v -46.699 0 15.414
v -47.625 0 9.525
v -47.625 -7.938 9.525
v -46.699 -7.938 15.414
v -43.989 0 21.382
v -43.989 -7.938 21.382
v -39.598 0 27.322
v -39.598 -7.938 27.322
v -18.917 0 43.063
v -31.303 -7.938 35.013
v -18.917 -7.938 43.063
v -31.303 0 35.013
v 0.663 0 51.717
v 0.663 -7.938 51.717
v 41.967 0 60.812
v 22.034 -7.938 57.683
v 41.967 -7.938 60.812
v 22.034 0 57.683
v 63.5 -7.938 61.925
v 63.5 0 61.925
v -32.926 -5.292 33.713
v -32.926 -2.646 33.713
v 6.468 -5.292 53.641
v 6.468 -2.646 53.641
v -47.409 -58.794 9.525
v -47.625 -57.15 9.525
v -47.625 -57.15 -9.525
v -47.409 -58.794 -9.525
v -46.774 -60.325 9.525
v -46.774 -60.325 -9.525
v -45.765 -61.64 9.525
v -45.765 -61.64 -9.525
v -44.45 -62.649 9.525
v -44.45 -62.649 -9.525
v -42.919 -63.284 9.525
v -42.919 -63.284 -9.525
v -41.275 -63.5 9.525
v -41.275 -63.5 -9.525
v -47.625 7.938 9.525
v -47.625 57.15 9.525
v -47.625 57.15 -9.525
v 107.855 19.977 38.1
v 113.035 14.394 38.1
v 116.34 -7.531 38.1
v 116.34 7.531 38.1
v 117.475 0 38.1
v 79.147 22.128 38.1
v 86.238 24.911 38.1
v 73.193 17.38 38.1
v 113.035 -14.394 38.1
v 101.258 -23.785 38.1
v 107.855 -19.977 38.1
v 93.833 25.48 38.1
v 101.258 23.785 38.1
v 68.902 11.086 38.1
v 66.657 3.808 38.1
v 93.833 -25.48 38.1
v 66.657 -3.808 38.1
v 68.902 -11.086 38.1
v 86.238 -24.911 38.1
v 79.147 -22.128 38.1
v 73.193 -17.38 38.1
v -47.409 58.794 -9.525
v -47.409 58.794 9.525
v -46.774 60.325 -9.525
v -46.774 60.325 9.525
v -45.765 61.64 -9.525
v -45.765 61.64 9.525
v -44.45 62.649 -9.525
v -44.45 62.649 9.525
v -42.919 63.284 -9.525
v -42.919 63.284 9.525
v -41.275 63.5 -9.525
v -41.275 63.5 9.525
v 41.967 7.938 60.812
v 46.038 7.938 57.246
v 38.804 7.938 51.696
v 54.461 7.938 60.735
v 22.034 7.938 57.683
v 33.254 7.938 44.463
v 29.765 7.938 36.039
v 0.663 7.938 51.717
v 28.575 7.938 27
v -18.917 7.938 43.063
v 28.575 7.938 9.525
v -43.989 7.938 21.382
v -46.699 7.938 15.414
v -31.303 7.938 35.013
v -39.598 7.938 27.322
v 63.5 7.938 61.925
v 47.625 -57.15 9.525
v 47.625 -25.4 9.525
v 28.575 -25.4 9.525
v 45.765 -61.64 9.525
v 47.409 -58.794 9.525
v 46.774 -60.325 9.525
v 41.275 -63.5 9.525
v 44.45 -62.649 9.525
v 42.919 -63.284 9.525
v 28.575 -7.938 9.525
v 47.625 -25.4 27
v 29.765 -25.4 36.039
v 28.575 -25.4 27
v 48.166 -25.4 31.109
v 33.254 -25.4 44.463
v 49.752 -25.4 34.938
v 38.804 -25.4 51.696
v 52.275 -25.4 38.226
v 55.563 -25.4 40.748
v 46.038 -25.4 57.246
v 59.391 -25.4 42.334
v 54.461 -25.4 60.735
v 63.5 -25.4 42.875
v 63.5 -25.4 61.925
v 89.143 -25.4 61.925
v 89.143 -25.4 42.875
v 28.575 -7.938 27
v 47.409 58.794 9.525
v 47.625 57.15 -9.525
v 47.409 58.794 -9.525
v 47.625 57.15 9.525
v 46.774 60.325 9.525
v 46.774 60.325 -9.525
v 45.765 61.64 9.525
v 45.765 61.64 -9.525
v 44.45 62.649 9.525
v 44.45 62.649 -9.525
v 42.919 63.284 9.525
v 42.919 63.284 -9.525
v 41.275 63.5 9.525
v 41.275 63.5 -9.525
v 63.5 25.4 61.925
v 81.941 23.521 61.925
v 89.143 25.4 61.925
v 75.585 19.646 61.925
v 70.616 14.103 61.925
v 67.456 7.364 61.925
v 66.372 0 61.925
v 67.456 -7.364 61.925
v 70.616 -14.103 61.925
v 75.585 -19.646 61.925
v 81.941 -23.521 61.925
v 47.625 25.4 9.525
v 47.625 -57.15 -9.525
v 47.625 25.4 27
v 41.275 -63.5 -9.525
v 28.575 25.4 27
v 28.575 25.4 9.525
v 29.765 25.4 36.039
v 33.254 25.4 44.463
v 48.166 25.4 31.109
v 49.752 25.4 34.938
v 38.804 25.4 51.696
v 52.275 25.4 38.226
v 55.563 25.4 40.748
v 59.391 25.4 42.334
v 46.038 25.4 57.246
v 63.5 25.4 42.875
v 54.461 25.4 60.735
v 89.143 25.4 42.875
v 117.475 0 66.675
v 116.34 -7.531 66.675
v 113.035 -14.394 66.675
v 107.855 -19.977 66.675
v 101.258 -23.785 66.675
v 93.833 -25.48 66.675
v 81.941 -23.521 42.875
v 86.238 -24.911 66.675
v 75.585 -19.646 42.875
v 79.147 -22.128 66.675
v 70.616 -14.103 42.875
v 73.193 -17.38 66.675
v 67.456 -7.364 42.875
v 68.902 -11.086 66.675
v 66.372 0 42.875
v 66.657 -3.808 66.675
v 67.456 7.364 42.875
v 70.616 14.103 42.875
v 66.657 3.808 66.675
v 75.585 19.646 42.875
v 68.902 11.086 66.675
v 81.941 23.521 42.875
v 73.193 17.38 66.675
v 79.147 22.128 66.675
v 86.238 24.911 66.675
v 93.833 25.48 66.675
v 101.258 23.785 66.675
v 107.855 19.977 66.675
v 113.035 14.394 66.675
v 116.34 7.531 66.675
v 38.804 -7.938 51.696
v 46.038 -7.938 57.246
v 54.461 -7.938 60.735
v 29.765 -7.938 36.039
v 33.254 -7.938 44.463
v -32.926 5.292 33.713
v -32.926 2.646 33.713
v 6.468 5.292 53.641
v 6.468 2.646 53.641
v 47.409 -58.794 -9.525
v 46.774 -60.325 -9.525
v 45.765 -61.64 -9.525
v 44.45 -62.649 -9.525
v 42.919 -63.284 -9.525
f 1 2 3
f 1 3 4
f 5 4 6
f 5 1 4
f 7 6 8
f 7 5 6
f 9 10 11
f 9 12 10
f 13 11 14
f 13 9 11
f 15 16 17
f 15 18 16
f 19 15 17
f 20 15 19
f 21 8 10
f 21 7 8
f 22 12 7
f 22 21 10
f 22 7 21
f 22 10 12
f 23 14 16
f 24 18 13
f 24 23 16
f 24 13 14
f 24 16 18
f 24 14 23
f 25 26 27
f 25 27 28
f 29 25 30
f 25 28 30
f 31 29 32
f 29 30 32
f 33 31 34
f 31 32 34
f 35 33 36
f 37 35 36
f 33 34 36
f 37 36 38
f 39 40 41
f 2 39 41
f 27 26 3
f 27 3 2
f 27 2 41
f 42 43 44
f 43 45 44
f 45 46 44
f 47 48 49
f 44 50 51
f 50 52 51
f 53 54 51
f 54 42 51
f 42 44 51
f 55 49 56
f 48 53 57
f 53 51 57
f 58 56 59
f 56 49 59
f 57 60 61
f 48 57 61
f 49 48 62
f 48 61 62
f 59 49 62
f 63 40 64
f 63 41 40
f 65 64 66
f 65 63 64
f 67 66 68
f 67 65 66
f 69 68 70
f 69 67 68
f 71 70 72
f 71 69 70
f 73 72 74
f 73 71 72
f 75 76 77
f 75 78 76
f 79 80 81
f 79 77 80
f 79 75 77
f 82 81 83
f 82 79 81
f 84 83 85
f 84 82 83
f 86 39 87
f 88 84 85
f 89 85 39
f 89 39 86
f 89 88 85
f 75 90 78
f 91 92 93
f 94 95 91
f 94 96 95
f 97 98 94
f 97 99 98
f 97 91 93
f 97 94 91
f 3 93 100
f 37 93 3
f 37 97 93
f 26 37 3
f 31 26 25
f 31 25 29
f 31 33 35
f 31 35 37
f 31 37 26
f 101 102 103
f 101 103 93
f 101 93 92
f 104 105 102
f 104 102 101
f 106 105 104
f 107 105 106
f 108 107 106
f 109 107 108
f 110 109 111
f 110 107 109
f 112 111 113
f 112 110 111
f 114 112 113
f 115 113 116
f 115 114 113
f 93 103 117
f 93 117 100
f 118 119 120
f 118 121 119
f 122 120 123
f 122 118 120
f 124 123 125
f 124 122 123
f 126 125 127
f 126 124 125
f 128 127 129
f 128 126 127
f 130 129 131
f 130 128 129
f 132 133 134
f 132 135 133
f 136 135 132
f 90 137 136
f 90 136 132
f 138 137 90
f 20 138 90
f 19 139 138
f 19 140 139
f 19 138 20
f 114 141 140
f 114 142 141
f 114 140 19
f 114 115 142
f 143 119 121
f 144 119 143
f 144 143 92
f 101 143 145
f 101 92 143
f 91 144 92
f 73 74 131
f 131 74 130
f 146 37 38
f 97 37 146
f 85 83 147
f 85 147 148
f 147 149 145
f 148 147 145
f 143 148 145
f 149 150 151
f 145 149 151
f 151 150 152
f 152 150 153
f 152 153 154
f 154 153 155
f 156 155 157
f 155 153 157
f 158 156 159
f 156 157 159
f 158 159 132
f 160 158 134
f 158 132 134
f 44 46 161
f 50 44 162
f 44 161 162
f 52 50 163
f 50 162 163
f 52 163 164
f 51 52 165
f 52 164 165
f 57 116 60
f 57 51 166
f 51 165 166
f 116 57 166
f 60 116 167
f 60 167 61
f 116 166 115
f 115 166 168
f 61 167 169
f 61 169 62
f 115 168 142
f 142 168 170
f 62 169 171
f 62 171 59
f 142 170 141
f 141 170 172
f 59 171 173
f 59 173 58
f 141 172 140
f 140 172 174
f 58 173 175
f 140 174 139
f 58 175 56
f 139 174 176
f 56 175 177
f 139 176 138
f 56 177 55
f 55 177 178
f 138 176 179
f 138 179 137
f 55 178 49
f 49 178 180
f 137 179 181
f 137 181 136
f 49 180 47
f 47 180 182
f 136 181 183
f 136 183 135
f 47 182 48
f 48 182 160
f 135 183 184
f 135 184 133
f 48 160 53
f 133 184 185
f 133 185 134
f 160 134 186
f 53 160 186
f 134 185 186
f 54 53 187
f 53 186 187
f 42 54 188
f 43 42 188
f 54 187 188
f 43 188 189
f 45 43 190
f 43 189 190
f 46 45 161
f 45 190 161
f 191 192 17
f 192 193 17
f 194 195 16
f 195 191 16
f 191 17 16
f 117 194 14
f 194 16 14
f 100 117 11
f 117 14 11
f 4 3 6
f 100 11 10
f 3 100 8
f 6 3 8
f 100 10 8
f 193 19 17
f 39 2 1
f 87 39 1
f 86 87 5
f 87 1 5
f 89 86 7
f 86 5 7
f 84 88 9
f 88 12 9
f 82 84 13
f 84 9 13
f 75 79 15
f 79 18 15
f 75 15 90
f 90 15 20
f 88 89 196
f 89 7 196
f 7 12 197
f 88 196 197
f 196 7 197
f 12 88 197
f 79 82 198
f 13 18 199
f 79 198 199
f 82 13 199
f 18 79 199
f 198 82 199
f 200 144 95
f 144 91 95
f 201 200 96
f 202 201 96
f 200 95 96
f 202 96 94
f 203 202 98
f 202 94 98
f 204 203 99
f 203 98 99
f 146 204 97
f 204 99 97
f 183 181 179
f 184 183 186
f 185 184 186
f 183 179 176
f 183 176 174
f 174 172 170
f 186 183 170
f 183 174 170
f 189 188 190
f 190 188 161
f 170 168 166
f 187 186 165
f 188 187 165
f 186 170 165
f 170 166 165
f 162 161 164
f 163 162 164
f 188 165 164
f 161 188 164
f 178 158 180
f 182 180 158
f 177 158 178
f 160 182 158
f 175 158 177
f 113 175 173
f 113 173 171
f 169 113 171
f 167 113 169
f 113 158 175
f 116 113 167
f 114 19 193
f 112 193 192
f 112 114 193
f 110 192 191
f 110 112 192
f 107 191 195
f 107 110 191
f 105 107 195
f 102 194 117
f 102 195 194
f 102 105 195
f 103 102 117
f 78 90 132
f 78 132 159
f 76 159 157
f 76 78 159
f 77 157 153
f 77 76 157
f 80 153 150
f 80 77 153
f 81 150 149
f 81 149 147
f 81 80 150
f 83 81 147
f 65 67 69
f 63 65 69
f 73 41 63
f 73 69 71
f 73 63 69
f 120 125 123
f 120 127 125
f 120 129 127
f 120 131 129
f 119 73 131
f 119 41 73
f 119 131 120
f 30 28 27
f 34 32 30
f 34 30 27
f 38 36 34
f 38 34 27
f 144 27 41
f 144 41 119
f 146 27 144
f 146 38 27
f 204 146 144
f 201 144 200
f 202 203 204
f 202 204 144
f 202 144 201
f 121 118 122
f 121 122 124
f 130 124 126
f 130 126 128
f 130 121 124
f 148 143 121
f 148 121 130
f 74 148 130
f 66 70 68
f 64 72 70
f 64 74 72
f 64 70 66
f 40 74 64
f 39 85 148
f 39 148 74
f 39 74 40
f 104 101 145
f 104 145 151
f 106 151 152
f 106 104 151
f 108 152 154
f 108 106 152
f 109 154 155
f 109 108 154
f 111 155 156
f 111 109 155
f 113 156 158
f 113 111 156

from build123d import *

# Parameters (mm, degrees)
F1_DEPTH = 63.5
F2_DEPTH = 7.9375
F0_W     = 25.248305
F0_H     = 19.05
F3_DEPTH = 25.4
F5_R     = 6.35


with BuildPart() as f1:
    # F0 (on Front) → F1 (new body, symmetric)
    with BuildSketch(Plane.XZ):
        Polygon((28.575, 9.525), (-47.625, 9.525), (-47.625, -9.525), (47.625, -9.525), (47.625, 9.525), align=None)
    extrude(amount=F1_DEPTH, both=True)

    # F0 (on Front) → F2 (join, symmetric)
    with BuildSketch(Plane.XZ):
        with BuildLine():
            add(Edge.make_bspline(
                [(-47.625, 9.525), (-47.625, 33.3817), (0, 61.9252), (63.5, 61.9252)],
                knots=[0, 0, 0, 0, 122.859866, 122.859866, 122.859866, 122.859866], degree=3))
            Line((-47.625, 9.525), (28.575, 9.525))
            Line((28.575, 9.525), (28.575, 27.0002))
            ThreePointArc((28.575, 27.0002), (38.804296, 51.695904), (63.5, 61.9252))
        make_face()
    extrude(amount=F2_DEPTH, both=True)

    # F0 (on Front) → F3 (join, symmetric)
    with BuildSketch(Plane.XZ):
        with BuildLine():
            Line((28.575, 27.0002), (28.575, 9.525))
            Line((28.575, 9.525), (47.625, 9.525))
            Line((47.625, 9.525), (47.625, 27.0002))
            ThreePointArc((47.625, 27.0002), (52.27468, 38.22552), (63.5, 42.8752))
            Line((63.5, 42.8752), (66.675, 42.8752))
            Line((66.675, 42.8752), (66.675, 61.9252))
            Line((66.675, 61.9252), (63.5, 61.9252))
            ThreePointArc((63.5, 61.9252), (38.804296, 51.695904), (28.575, 27.0002))
        make_face()
        with Locations((79.299152, 52.4002)):
            Rectangle(F0_W, F0_H)
    extrude(amount=F3_DEPTH, both=True)

    # F0 (on Front) → F4 (revolve)
    with BuildSketch(Plane.XZ):
        Polygon((91.923305, 66.675), (91.923305, 61.9252), (91.923305, 42.8752), (91.923305, 38.1), (117.475, 38.1), (117.475, 66.675), align=None)
    revolve(axis=Axis((91.923305, 0, 52.3875), (0, 0, -1)))

    # F5
    f5_edges = [f1.edges().sort_by_distance(p)[0] for p in [
        (47.625, -63.5, 0),
        (-47.625, -63.5, 0),
        (-47.625, 63.5, 0),
        (47.625, 63.5, 0),
    ]]
    fillet(f5_edges, radius=F5_R)


solid = f1.part
